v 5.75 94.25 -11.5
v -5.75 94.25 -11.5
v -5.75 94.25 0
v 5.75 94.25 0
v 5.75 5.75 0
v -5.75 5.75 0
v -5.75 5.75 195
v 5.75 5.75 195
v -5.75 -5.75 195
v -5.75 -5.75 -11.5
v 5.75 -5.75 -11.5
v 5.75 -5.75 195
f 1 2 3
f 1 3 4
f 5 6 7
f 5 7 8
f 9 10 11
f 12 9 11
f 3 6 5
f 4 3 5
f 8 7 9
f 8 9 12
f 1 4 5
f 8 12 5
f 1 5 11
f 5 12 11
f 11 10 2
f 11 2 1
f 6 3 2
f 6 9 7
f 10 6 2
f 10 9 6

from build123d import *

# Parameters (mm, degrees)
SKETCH1_W           = 11.5
SKETCH1_H           = 11.5
BOSS_EXTRUDE1_DEPTH = 195
BOSS_EXTRUDE2_START = -5.75
SKETCH2_W           = 11.5
SKETCH2_H           = 11.5
BOSS_EXTRUDE2_DEPTH = 100


with BuildPart() as part:
    # Sketch1 → Boss-Extrude1 (new body)
    with BuildSketch(Plane.XY):
        Rectangle(SKETCH1_W, SKETCH1_H)
    extrude(amount=BOSS_EXTRUDE1_DEPTH)

    # Sketch2 → Boss-Extrude2 (add)
    with BuildSketch(Plane(origin=(0, 0, 0), x_dir=(1, 0, 0), z_dir=(0, 1, 0)).offset(BOSS_EXTRUDE2_START)):
        with Locations((0, 5.75)):
            Rectangle(SKETCH2_W, SKETCH2_H)
    extrude(amount=BOSS_EXTRUDE2_DEPTH)


solid = part.part
